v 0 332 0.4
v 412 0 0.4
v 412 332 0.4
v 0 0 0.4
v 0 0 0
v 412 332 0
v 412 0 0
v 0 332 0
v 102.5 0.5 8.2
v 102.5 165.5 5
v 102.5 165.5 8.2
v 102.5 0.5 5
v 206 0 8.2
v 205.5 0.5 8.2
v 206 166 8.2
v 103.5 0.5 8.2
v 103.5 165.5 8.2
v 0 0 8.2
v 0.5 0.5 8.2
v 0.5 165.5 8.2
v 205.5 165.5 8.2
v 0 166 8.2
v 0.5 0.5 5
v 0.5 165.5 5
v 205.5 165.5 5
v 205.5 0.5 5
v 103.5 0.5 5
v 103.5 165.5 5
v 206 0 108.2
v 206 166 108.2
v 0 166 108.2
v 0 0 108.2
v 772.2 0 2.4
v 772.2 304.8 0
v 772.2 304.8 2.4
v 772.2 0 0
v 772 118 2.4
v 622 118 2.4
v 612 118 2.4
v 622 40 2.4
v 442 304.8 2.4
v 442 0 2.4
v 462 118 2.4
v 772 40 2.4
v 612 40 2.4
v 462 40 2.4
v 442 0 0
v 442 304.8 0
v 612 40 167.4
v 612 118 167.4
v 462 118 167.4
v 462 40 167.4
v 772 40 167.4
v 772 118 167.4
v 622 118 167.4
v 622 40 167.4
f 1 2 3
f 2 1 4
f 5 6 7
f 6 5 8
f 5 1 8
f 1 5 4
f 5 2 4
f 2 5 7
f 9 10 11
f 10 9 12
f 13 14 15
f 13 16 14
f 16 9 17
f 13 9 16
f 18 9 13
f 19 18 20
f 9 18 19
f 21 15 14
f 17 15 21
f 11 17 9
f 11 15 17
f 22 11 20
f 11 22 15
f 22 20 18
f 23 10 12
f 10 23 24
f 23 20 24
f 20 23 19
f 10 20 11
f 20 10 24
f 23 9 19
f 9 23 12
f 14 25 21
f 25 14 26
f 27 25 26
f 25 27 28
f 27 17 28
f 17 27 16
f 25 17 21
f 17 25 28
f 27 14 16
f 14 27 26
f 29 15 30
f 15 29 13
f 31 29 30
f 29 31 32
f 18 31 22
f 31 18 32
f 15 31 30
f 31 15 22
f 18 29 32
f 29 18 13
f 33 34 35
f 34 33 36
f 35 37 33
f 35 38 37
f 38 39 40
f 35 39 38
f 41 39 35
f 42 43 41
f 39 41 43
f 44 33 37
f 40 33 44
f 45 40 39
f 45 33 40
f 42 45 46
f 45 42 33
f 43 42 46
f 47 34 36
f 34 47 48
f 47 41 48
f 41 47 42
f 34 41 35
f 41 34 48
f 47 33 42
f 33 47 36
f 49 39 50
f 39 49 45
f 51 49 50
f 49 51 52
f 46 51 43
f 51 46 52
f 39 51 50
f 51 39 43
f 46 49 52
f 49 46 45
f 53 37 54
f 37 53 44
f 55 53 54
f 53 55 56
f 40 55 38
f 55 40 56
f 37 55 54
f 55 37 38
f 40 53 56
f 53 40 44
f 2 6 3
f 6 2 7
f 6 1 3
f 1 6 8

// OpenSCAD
// First-system mechanical envelopes.
// Generated by generate_envelopes.py — numbers cited in docs/oam_mechanical_envelope_v1.md
// NOT a fabrication or cooling-qualification model.

oam_w = 102.0;
oam_l = 165.0;
oam_t = 3.2;
koz_w = 103.0;
koz_l = 166.0;
stack_h = 5.0;
two_w = 2*koz_w;
eight_w = 4*koz_w;
eight_l = 2*koz_l;
host_w = 330.2;
host_l = 304.8;
cooler_w = 150.0;
cooler_d = 78.0;
cooler_h = 165.0;
cooling_planning_h = 100.0; // UNKNOWN real HS height

module oam_pcb() color([0.55,0.75,0.45]) cube([oam_w, oam_l, oam_t]);
module koz() color([0.2,0.4,0.8,0.25]) cube([koz_w, koz_l, 0.4]);

module two_gpu() {
    for (i=[0:1]) translate([i*koz_w, 0, 0]) {
        koz();
        translate([0.5, 0.5, stack_h]) oam_pcb();
    }
    color([1,0.6,0.1,0.2]) translate([0,0,stack_h+oam_t])
        cube([two_w, koz_l, cooling_planning_h]);
}

module eight_reserve() color([1,0.5,0,0.12]) cube([eight_w, eight_l, 0.4]);

module host() {
    color([0.6,0.3,0.7]) cube([host_w, host_l, 2.4]);
    // CPU-to-CPU pitch UNKNOWN — coolers shown as placeholders, not socket-accurate
    color([0.45,0.15,0.6,0.7]) translate([20, 40, 2.4]) cube([cooler_w, cooler_d, cooler_h]);
    color([0.45,0.15,0.6,0.7]) translate([180, 40, 2.4]) cube([cooler_w, cooler_d, cooler_h]);
}

eight_reserve();
two_gpu();
translate([eight_w + 30, 0, 0]) host();
